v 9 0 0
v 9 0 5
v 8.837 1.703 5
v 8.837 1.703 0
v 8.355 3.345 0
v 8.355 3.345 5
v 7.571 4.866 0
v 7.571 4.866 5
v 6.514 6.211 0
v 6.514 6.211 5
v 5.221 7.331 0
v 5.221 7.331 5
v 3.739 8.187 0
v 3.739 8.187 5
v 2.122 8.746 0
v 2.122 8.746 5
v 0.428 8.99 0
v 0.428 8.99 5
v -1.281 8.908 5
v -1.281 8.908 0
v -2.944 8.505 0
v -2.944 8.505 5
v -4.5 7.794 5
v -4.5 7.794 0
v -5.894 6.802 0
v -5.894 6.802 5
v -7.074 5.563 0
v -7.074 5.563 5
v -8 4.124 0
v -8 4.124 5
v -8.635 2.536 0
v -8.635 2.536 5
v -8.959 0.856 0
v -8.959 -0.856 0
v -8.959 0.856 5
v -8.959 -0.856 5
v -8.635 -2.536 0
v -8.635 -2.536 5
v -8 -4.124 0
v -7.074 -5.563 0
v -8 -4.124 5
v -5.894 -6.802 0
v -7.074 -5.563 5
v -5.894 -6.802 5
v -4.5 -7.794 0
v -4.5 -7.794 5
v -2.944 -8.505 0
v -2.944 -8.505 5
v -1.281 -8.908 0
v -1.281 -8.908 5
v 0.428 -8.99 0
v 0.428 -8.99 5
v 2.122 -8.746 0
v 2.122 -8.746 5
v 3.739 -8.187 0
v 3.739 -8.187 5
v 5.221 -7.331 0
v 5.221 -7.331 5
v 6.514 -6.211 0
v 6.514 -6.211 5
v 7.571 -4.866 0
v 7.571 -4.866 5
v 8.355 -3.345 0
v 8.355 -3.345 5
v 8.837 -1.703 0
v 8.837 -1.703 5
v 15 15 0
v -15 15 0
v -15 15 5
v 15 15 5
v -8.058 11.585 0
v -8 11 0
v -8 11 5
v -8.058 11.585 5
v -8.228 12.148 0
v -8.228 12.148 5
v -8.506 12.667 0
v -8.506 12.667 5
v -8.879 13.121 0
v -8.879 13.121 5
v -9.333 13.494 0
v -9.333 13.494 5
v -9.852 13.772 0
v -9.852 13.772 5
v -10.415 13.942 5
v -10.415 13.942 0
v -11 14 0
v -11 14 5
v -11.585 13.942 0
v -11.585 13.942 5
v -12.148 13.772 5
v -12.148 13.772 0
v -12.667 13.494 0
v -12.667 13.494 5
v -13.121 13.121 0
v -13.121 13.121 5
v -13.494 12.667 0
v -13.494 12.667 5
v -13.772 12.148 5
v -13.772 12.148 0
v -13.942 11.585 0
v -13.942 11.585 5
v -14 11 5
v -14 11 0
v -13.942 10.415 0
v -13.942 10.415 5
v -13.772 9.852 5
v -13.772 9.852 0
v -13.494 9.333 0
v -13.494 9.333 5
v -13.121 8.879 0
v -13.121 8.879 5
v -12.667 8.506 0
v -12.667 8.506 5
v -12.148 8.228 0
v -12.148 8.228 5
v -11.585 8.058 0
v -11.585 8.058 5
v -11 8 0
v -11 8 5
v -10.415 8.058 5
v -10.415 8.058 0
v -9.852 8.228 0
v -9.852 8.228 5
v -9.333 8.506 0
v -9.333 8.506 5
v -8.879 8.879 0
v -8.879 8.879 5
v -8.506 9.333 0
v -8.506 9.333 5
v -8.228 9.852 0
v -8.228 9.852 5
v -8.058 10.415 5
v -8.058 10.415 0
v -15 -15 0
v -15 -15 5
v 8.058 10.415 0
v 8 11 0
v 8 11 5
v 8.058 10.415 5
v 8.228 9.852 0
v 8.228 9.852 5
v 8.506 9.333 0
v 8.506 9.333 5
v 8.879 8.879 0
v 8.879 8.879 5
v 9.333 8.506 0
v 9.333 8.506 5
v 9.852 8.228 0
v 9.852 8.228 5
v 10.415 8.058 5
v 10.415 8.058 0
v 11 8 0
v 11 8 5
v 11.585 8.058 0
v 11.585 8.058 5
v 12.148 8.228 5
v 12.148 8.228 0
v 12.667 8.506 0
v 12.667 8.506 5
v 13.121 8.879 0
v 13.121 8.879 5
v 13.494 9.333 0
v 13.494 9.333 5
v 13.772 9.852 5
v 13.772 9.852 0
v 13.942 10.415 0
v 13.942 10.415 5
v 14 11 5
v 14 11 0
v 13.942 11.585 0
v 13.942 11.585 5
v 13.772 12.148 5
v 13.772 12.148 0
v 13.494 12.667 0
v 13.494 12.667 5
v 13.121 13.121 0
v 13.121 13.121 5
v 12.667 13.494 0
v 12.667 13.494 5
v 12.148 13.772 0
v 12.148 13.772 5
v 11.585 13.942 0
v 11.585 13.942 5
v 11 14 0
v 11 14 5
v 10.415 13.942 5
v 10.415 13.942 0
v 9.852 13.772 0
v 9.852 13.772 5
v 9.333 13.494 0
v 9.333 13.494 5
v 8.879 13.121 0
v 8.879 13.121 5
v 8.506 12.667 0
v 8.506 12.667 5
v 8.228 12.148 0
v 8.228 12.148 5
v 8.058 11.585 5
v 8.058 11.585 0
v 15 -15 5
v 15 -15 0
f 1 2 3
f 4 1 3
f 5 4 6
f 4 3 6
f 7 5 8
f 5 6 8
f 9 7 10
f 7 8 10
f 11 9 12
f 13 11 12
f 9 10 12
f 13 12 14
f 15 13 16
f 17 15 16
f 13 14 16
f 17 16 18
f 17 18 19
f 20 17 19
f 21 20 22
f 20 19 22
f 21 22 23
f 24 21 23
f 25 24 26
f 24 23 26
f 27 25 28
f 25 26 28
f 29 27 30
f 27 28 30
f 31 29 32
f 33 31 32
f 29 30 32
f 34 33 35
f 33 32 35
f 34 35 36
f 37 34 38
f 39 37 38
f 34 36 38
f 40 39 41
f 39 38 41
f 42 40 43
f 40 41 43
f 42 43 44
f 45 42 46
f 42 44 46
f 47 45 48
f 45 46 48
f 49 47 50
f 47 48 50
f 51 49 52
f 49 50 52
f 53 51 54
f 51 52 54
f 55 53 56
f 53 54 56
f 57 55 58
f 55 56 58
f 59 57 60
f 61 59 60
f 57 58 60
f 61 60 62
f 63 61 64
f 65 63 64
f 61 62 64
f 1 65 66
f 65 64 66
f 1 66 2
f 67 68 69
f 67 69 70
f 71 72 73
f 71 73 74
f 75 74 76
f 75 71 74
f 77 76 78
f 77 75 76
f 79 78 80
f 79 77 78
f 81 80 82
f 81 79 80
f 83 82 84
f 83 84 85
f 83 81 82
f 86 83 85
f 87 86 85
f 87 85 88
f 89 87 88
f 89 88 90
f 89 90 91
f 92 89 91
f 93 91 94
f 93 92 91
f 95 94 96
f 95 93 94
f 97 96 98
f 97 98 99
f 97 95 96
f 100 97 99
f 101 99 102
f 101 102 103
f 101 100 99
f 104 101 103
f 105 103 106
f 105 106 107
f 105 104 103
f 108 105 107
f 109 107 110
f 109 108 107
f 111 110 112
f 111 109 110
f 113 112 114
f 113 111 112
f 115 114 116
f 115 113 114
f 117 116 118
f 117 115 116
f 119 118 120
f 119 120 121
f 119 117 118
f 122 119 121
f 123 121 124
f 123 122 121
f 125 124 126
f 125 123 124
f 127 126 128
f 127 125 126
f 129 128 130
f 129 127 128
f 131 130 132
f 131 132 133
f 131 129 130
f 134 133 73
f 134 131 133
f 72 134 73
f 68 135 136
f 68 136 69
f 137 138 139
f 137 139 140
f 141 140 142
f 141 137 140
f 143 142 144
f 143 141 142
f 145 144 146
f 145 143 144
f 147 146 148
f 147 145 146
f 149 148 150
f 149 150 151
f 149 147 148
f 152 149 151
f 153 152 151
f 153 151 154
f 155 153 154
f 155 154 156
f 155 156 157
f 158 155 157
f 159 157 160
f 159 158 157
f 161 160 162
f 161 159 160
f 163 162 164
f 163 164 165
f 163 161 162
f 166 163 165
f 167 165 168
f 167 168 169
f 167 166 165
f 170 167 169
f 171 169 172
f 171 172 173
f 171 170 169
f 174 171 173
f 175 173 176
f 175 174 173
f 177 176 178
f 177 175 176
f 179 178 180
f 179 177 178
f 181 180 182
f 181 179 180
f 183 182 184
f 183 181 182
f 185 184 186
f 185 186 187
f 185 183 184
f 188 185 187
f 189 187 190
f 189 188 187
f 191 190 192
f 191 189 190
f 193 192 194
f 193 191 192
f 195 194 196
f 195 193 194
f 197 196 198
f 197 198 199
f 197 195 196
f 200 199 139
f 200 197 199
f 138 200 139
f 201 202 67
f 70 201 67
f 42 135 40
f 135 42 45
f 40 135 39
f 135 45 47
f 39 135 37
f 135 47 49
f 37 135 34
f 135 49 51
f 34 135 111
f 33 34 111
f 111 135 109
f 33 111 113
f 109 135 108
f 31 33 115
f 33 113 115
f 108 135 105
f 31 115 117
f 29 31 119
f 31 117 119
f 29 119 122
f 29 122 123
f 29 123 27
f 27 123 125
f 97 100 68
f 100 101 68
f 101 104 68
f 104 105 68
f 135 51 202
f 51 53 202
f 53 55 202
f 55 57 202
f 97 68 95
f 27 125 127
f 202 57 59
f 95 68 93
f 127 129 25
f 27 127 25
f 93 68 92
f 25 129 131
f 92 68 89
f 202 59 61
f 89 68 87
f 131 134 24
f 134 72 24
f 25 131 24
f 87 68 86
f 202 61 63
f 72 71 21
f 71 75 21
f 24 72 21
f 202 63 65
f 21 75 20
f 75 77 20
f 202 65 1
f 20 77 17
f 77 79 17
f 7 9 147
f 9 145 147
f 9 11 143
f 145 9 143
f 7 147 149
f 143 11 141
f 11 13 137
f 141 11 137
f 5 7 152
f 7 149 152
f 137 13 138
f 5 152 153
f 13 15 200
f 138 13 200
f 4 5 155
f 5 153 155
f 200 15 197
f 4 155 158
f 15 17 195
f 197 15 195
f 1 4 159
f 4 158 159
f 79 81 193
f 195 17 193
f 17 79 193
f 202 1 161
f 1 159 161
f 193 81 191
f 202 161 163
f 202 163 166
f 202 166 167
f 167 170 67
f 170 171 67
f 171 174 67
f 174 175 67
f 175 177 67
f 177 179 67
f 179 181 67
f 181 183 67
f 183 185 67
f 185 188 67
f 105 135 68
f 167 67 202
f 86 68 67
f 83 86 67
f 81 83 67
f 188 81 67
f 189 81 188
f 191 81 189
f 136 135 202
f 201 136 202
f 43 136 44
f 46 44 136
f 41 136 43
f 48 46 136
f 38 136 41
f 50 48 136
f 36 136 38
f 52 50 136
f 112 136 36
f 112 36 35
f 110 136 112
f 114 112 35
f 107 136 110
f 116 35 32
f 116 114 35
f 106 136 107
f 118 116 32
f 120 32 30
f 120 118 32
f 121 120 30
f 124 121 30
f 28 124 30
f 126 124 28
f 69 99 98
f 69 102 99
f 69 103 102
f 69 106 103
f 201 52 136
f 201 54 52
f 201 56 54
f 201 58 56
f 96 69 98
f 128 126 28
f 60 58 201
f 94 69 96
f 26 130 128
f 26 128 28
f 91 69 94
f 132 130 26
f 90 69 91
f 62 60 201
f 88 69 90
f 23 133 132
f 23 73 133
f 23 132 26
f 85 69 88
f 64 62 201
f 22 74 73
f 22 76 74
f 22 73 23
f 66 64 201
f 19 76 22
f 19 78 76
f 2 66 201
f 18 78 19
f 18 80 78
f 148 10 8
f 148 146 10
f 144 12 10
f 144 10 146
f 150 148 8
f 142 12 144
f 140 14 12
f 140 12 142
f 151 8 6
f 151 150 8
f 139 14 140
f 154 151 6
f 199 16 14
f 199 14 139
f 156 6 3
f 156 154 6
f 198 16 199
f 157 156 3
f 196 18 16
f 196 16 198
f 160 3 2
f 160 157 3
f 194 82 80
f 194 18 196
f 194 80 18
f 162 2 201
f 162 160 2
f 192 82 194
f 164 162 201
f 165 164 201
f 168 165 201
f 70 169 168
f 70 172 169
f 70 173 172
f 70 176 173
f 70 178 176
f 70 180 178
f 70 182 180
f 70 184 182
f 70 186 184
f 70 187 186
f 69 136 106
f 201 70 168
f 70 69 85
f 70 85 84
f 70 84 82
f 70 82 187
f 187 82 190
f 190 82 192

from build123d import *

# Parameters (mm, degrees)
CROQUIS1_W              = 30
CROQUIS1_H              = 30
CROQUIS1_R              = 3
SALIENTE_EXTRUIR1_DEPTH = 5
CROQUIS2_R              = 9
CORTAR_EXTRUIR1_DEPTH   = 5


with BuildPart() as part:
    # Croquis1 → Saliente-Extruir1 (new body)
    with BuildSketch(Plane.XY):
        Rectangle(CROQUIS1_W, CROQUIS1_H)
        with Locations((-11, 11)):
            Circle(CROQUIS1_R, mode=Mode.SUBTRACT)
        with Locations(Location((11, 11, 0), (0, 0, 180))):
            Circle(CROQUIS1_R, mode=Mode.SUBTRACT)
    extrude(amount=SALIENTE_EXTRUIR1_DEPTH)

    # Croquis2 → Cortar-Extruir1 (cut)
    with BuildSketch(Plane.XY.offset(5)):
        Circle(CROQUIS2_R)
    extrude(amount=-CORTAR_EXTRUIR1_DEPTH, mode=Mode.SUBTRACT)


solid = part.part
